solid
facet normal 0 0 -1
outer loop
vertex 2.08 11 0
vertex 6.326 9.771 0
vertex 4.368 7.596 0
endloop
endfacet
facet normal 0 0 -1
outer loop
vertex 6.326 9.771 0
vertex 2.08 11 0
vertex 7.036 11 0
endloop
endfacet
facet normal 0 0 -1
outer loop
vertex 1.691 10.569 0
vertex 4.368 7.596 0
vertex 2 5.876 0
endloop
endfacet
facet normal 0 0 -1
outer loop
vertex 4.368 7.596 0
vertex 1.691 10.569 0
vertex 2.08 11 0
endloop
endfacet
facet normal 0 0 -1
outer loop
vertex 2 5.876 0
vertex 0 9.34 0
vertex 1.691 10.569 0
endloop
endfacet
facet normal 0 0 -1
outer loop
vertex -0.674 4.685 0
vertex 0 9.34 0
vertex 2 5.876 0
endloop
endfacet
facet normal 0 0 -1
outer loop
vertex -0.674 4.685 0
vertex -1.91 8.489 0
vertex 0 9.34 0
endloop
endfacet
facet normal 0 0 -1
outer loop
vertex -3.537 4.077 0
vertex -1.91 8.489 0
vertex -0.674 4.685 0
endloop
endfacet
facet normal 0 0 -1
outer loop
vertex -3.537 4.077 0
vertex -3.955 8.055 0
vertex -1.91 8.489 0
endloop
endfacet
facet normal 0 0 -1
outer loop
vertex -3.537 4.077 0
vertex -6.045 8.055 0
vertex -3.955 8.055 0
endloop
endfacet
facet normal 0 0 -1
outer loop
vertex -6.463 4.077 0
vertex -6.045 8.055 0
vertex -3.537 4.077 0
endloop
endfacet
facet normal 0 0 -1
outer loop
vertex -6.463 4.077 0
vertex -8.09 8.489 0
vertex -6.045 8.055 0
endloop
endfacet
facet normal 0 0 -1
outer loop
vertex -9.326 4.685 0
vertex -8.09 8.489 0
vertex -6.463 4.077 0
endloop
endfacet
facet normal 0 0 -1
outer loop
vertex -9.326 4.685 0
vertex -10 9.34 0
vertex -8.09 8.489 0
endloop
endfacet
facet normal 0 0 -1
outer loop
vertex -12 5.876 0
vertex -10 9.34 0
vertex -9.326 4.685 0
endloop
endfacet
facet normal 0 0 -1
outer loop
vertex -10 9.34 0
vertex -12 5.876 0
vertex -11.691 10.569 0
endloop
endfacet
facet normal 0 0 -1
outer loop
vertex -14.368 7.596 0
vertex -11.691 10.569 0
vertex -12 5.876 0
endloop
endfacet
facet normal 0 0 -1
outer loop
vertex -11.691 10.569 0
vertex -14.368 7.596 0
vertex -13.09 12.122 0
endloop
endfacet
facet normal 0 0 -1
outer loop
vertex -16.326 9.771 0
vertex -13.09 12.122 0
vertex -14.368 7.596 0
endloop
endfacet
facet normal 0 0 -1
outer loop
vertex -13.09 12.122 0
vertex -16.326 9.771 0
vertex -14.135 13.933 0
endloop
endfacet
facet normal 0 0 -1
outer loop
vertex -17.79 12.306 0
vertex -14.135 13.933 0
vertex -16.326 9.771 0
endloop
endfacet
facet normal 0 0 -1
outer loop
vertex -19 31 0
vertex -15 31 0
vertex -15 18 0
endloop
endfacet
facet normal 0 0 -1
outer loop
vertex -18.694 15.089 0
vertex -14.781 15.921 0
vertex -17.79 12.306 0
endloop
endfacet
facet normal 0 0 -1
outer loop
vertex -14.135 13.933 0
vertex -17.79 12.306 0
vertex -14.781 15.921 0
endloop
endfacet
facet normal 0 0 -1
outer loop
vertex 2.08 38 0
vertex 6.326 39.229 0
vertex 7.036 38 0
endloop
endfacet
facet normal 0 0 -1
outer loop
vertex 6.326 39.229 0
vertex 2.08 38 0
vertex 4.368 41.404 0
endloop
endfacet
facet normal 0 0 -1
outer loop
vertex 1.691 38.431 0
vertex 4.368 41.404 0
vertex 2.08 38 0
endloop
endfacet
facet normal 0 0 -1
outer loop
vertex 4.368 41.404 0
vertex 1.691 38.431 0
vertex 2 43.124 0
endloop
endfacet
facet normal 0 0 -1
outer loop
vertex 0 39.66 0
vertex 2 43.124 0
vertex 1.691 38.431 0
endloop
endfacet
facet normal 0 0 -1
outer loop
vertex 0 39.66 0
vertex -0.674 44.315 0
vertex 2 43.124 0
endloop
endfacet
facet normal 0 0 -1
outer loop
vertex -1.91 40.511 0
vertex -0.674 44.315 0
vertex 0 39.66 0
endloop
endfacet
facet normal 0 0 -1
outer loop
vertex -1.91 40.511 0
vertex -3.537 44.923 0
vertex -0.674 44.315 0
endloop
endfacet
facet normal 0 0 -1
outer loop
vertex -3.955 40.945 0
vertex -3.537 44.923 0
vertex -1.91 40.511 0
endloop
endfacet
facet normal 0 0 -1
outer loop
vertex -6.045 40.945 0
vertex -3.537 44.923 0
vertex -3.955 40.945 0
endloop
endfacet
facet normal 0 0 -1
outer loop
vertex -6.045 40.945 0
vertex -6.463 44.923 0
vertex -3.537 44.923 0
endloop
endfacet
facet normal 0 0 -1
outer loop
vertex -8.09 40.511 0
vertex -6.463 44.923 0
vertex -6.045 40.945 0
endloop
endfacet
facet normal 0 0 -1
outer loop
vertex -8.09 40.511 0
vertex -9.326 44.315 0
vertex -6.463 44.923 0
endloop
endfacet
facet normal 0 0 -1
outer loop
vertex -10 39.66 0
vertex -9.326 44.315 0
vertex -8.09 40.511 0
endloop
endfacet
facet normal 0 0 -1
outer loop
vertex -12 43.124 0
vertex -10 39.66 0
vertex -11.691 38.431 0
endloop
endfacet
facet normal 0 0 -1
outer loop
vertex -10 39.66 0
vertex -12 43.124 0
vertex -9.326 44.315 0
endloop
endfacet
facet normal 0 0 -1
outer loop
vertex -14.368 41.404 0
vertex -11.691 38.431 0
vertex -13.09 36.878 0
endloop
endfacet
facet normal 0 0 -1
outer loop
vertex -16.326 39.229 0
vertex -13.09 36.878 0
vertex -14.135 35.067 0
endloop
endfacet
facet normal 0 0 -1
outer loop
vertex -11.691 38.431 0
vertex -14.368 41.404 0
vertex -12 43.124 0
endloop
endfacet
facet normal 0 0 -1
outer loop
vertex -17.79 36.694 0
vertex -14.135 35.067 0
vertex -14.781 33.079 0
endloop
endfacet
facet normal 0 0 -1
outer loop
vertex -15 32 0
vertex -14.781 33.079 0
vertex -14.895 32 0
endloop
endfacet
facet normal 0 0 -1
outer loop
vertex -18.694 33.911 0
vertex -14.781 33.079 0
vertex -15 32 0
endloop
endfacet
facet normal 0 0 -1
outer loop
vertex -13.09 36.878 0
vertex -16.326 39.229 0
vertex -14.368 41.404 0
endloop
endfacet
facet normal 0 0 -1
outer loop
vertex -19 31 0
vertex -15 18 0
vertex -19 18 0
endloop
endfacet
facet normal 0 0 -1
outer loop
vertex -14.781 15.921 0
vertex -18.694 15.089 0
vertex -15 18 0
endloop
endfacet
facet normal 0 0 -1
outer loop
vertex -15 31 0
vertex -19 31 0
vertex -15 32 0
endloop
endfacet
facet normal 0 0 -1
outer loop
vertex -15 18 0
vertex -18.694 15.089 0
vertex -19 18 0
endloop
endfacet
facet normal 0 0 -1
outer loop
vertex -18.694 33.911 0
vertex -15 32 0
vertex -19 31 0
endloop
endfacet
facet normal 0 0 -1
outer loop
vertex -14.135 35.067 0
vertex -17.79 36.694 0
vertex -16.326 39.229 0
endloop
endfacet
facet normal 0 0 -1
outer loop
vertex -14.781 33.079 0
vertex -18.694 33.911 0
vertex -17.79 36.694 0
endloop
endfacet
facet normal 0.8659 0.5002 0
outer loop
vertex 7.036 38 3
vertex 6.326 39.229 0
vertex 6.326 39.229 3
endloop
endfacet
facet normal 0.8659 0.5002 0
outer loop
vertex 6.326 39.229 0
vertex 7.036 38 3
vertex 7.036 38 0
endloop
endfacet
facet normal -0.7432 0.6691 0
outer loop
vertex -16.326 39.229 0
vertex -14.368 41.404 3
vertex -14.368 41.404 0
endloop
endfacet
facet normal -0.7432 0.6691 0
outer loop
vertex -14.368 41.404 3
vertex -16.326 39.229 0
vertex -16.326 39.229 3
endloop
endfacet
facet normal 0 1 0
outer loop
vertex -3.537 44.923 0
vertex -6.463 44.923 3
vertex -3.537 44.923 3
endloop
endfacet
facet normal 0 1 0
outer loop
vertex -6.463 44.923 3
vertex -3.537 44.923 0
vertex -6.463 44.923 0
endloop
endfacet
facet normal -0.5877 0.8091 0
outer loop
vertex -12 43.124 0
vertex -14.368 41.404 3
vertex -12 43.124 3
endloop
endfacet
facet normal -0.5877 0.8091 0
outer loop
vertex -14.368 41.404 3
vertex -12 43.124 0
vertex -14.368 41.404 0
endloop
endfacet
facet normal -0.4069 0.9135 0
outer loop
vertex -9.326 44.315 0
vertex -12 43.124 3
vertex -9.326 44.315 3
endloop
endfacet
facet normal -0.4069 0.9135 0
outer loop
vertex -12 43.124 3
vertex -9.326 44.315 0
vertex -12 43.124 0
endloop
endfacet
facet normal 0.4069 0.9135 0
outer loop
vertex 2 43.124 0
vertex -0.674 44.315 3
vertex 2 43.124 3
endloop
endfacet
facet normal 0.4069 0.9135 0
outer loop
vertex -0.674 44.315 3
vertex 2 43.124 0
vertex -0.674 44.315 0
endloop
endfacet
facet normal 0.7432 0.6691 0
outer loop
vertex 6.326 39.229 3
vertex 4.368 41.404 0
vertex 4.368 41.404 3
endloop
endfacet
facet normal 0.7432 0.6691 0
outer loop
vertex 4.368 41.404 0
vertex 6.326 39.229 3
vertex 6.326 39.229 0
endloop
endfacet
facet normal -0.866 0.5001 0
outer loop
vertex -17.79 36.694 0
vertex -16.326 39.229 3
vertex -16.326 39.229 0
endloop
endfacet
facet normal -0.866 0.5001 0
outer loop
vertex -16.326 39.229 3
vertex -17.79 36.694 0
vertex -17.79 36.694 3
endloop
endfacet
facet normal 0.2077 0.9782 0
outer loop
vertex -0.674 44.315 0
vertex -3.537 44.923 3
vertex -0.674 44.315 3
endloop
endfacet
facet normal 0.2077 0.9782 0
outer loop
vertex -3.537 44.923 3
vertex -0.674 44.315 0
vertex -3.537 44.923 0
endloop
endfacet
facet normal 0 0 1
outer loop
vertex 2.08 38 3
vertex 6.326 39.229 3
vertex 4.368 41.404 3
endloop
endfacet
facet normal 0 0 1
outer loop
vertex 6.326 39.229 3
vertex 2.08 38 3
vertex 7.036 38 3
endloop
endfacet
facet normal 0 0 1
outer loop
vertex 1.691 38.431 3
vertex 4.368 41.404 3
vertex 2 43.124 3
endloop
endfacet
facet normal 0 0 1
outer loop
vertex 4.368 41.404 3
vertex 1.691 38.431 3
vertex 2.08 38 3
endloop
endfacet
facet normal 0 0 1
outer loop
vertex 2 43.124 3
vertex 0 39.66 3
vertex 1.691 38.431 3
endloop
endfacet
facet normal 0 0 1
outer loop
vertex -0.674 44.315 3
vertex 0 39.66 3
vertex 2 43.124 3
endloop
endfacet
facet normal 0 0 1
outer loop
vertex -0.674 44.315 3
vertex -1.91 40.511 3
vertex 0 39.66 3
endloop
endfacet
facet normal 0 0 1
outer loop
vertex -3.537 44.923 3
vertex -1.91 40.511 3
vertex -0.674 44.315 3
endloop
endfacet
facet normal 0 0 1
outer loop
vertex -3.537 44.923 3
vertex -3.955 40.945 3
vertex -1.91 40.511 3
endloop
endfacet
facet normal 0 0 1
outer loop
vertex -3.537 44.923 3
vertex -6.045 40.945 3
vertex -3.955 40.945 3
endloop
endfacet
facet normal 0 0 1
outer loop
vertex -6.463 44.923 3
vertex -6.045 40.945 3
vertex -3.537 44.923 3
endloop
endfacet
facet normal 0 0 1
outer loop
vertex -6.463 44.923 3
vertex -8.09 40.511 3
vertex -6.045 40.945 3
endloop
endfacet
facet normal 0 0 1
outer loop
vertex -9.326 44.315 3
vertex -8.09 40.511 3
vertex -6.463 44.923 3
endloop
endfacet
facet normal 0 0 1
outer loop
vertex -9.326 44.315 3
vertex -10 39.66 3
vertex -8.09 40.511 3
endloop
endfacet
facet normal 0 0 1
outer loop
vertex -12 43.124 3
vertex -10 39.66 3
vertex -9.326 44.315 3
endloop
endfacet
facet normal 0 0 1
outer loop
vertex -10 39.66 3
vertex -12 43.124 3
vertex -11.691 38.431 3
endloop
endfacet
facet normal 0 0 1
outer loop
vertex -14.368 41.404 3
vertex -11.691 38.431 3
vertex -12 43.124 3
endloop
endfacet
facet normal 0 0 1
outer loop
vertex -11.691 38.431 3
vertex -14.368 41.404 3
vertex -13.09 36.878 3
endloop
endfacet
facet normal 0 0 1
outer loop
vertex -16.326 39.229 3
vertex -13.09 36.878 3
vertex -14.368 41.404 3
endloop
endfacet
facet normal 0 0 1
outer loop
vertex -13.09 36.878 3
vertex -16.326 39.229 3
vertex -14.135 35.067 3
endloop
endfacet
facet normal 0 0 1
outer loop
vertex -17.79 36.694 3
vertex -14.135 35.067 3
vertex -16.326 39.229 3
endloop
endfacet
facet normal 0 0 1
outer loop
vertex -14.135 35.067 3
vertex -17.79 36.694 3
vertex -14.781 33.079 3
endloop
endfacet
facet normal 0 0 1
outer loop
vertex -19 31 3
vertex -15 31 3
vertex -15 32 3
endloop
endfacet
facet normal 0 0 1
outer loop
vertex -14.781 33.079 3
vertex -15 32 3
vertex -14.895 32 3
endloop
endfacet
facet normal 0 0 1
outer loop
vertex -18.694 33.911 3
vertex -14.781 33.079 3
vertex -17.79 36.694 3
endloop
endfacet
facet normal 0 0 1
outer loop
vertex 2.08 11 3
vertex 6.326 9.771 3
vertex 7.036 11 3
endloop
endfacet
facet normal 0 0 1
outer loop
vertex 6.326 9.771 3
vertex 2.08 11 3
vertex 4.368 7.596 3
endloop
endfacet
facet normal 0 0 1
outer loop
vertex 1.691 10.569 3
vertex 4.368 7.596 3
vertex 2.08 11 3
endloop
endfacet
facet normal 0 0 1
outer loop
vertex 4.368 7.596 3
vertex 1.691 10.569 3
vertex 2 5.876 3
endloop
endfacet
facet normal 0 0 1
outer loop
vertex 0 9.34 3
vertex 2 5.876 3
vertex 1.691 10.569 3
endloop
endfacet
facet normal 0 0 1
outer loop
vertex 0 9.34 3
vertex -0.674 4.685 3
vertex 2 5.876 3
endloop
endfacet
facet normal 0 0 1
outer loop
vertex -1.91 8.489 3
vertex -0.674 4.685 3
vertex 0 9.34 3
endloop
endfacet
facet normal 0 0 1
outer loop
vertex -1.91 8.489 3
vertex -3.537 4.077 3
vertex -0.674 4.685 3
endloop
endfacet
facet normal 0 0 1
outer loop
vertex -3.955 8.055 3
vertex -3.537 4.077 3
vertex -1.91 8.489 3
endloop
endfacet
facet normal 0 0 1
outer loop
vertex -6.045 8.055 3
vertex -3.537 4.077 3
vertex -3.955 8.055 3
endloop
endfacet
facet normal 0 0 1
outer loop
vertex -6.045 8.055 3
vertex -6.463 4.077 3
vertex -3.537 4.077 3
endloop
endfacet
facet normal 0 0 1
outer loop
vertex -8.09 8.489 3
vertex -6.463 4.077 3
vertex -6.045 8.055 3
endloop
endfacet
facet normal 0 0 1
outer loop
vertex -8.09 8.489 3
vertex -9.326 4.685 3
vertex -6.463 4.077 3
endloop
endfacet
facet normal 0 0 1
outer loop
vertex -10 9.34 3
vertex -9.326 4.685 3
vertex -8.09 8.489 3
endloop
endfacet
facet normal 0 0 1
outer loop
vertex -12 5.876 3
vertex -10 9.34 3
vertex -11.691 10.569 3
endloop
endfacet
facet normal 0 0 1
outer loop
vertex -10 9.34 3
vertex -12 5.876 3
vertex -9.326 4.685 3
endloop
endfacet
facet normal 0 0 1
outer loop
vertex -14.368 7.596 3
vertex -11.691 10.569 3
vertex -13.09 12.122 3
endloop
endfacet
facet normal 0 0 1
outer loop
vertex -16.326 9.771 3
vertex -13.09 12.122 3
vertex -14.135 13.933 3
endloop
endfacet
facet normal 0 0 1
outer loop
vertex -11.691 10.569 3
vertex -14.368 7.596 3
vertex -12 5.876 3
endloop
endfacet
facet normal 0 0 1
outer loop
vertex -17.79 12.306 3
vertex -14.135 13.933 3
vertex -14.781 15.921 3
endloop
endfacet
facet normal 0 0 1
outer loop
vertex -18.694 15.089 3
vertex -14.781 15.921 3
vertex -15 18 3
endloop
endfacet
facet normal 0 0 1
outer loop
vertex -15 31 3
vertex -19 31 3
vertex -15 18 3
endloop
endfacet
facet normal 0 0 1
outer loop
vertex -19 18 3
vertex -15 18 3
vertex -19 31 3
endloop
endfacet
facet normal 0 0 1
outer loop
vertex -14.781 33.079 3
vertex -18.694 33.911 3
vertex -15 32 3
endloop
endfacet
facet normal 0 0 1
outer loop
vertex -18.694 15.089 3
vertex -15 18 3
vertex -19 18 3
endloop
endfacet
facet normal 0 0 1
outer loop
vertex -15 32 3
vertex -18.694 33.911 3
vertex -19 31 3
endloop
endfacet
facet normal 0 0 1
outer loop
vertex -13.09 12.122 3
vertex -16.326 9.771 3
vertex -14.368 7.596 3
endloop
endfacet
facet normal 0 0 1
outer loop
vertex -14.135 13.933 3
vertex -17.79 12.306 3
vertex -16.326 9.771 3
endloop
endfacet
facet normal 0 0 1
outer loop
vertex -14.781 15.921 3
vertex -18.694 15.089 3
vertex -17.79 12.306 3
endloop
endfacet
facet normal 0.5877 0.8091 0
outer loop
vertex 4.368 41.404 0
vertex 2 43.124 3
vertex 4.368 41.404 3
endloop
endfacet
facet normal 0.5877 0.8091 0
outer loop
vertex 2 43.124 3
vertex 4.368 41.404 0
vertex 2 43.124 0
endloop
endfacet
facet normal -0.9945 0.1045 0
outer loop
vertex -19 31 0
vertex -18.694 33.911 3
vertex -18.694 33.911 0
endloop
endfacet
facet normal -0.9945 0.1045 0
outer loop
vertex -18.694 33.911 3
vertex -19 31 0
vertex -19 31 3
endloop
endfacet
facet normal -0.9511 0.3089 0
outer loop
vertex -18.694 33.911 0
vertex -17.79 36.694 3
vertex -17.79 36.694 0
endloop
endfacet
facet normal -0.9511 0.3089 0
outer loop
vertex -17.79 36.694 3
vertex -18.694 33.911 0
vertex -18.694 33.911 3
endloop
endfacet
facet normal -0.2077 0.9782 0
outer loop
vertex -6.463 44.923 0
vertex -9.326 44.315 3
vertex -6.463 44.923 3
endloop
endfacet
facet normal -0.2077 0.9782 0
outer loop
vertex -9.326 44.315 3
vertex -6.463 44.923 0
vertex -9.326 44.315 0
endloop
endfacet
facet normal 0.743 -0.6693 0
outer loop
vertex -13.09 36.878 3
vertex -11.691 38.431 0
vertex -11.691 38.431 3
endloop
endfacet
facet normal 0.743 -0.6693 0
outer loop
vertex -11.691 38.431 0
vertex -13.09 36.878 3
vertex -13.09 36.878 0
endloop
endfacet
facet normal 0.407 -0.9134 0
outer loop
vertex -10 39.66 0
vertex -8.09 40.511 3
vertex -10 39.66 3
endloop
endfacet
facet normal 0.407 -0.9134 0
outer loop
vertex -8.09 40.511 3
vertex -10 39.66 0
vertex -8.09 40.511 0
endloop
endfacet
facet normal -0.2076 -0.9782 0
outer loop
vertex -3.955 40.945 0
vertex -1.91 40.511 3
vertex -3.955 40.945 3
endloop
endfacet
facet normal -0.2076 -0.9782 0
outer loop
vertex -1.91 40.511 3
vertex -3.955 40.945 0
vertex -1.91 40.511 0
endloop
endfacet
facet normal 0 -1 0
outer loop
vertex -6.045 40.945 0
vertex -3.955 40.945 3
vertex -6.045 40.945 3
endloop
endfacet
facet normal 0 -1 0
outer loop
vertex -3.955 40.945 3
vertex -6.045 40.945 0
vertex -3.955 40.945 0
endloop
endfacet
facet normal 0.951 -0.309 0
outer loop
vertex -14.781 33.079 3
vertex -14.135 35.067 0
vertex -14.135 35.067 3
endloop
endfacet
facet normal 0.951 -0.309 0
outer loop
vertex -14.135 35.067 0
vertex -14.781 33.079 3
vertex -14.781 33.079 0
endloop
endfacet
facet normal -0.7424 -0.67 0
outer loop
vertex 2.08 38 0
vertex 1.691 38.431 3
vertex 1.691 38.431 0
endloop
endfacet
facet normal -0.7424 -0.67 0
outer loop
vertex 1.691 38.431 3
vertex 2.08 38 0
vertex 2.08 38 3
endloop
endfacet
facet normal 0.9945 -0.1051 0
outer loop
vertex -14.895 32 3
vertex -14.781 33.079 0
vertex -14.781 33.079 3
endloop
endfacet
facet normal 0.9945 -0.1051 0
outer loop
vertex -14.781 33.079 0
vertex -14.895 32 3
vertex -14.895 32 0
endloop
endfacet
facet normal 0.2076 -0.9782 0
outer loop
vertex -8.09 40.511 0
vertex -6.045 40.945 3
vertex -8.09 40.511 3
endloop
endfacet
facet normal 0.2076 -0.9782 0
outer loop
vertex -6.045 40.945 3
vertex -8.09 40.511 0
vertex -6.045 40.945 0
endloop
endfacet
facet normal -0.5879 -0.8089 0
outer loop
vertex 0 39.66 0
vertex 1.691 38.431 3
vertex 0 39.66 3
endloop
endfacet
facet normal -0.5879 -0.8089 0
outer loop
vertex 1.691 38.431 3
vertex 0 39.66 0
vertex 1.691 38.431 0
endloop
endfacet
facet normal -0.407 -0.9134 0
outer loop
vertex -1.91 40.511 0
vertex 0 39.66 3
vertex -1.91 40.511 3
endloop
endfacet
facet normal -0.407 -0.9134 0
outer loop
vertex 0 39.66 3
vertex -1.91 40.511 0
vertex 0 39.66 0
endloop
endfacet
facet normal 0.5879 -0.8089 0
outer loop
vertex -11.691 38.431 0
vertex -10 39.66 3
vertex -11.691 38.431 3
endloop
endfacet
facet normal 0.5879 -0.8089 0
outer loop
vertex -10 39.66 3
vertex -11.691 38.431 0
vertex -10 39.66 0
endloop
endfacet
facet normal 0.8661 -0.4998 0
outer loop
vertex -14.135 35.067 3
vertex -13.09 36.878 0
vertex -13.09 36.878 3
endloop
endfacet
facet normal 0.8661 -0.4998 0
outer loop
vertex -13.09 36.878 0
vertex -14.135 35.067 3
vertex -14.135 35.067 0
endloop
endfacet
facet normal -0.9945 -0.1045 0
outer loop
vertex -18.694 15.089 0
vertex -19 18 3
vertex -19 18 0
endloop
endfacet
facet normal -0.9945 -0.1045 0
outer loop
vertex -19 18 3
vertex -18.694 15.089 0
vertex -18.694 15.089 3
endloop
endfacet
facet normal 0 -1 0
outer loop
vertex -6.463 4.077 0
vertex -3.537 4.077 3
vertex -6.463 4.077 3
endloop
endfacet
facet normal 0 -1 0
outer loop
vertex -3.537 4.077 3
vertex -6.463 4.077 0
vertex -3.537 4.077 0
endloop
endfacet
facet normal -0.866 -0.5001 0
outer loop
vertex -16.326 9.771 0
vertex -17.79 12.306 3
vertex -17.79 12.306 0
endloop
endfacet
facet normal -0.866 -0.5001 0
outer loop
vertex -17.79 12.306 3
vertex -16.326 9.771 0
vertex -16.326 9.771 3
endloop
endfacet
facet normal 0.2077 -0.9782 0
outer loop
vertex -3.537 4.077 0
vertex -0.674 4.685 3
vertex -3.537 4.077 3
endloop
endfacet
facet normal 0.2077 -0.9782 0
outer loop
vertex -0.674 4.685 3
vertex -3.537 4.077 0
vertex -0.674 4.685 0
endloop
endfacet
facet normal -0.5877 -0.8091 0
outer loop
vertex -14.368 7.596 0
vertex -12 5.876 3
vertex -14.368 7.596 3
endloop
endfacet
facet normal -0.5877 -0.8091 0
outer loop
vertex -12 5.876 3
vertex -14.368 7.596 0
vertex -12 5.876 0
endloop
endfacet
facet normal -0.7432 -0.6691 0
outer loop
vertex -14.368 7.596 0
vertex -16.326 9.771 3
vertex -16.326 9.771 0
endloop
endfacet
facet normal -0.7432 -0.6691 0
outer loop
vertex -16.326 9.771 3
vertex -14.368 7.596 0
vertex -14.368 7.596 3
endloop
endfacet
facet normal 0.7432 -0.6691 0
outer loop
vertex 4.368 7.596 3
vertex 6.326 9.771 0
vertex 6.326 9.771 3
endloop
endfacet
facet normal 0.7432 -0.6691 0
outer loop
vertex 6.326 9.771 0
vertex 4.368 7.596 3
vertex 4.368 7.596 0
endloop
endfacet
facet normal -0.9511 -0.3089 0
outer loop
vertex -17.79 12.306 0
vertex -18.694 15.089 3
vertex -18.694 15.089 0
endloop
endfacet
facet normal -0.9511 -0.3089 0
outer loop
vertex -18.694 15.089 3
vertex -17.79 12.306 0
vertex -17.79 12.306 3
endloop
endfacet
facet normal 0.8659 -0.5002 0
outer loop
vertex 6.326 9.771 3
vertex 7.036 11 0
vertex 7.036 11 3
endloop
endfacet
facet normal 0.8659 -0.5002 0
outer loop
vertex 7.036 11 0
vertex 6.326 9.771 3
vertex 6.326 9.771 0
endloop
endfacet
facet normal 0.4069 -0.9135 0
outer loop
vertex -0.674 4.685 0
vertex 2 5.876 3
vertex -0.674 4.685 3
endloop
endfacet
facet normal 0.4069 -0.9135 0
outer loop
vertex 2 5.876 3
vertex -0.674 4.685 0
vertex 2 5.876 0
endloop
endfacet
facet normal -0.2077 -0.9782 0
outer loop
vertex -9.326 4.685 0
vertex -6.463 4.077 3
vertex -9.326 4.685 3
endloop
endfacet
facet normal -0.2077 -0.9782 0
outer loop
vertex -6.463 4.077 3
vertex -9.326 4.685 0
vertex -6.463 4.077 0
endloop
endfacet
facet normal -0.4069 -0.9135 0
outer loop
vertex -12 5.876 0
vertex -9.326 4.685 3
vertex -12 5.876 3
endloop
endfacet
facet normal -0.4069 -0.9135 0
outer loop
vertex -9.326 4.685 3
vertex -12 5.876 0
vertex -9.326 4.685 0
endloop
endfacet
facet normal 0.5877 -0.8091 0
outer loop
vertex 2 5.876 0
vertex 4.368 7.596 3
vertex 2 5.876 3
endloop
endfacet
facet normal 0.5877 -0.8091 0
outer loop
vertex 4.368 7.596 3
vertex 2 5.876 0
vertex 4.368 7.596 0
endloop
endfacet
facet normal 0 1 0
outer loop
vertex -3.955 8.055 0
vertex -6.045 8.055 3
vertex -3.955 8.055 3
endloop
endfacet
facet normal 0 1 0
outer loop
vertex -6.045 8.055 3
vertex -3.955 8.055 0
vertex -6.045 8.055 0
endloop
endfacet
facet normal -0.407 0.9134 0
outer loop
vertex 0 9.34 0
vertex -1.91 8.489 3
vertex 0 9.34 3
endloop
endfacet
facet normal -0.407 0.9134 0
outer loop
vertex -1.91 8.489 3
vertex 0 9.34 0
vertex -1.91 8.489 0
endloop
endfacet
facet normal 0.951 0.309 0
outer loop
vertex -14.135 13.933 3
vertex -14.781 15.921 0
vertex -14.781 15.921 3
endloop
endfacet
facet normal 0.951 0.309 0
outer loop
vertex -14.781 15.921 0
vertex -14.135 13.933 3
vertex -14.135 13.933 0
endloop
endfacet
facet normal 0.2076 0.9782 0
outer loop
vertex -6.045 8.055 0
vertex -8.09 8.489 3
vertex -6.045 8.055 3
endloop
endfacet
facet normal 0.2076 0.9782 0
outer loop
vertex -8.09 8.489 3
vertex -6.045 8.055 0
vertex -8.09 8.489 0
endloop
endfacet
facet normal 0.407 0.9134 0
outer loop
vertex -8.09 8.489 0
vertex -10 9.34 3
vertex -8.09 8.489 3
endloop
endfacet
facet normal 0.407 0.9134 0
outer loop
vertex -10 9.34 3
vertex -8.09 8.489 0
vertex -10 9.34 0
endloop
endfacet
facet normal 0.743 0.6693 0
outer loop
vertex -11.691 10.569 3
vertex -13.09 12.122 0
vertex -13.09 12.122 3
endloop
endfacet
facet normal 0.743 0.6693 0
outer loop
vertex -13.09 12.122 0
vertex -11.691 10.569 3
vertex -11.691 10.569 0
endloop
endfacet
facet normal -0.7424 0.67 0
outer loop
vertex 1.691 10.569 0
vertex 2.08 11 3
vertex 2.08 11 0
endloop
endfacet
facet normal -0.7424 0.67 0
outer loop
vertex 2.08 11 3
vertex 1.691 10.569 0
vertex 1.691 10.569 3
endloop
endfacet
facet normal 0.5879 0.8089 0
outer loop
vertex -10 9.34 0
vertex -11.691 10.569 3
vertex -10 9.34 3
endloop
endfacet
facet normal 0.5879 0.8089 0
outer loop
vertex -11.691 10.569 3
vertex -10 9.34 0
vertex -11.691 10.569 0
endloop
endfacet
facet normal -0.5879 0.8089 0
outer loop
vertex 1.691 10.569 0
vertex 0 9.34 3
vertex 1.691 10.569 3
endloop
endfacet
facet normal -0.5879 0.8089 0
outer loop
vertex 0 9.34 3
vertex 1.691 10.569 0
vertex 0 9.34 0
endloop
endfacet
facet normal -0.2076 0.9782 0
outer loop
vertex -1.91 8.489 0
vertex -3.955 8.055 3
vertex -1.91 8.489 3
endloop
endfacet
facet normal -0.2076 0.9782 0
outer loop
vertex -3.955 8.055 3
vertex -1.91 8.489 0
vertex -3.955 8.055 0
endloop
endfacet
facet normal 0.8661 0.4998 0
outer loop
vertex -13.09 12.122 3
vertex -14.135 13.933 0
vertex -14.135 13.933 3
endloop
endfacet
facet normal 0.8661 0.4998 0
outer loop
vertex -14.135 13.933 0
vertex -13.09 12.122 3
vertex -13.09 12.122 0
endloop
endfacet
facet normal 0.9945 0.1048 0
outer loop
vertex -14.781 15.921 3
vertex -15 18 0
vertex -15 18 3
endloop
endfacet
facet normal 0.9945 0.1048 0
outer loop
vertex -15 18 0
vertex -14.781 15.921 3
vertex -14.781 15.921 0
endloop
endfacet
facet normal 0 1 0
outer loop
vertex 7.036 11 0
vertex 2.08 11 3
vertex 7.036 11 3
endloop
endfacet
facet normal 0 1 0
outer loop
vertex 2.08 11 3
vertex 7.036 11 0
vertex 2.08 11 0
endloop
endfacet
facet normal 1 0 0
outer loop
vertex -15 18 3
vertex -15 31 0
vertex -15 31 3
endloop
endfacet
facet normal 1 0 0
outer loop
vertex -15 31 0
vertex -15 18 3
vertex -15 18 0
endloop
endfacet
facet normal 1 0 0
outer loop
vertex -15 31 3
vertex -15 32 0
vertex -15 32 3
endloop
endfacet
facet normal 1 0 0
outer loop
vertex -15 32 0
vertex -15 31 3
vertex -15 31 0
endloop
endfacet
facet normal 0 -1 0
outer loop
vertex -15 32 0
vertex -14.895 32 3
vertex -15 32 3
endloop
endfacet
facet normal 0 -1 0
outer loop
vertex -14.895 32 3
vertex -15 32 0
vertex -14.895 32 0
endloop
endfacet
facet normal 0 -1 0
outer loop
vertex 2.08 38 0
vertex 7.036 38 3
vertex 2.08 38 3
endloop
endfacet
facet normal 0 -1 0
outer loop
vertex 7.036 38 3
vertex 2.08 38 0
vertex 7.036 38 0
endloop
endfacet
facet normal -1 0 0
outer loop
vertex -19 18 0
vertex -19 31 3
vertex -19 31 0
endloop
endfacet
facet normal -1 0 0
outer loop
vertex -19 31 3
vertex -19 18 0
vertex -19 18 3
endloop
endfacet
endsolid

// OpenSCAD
// буква с
translate([-45,5,0])
union(){

translate([26,13,0]) cube([4,13,3]);
difference(){
union(){
	
  difference(){
  translate([40,26,0]) cylinder(3,14,14);
  translate([40,26,0]) cylinder(3,10,10);
  translate([33,12,0]) cube([20,20,3]);

}

difference(){
  translate([40,13,0]) cylinder(3,14,14);
  translate([40,13,0]) cylinder(3,10,10);
  translate([32,15,0]) cube([19,13,3]);
  translate([40,6,0]) cube(20);
}
}
  translate([30,13,0]) cube([5,14,4]);
  translate([42,13,0]) cube(20);
}
}
